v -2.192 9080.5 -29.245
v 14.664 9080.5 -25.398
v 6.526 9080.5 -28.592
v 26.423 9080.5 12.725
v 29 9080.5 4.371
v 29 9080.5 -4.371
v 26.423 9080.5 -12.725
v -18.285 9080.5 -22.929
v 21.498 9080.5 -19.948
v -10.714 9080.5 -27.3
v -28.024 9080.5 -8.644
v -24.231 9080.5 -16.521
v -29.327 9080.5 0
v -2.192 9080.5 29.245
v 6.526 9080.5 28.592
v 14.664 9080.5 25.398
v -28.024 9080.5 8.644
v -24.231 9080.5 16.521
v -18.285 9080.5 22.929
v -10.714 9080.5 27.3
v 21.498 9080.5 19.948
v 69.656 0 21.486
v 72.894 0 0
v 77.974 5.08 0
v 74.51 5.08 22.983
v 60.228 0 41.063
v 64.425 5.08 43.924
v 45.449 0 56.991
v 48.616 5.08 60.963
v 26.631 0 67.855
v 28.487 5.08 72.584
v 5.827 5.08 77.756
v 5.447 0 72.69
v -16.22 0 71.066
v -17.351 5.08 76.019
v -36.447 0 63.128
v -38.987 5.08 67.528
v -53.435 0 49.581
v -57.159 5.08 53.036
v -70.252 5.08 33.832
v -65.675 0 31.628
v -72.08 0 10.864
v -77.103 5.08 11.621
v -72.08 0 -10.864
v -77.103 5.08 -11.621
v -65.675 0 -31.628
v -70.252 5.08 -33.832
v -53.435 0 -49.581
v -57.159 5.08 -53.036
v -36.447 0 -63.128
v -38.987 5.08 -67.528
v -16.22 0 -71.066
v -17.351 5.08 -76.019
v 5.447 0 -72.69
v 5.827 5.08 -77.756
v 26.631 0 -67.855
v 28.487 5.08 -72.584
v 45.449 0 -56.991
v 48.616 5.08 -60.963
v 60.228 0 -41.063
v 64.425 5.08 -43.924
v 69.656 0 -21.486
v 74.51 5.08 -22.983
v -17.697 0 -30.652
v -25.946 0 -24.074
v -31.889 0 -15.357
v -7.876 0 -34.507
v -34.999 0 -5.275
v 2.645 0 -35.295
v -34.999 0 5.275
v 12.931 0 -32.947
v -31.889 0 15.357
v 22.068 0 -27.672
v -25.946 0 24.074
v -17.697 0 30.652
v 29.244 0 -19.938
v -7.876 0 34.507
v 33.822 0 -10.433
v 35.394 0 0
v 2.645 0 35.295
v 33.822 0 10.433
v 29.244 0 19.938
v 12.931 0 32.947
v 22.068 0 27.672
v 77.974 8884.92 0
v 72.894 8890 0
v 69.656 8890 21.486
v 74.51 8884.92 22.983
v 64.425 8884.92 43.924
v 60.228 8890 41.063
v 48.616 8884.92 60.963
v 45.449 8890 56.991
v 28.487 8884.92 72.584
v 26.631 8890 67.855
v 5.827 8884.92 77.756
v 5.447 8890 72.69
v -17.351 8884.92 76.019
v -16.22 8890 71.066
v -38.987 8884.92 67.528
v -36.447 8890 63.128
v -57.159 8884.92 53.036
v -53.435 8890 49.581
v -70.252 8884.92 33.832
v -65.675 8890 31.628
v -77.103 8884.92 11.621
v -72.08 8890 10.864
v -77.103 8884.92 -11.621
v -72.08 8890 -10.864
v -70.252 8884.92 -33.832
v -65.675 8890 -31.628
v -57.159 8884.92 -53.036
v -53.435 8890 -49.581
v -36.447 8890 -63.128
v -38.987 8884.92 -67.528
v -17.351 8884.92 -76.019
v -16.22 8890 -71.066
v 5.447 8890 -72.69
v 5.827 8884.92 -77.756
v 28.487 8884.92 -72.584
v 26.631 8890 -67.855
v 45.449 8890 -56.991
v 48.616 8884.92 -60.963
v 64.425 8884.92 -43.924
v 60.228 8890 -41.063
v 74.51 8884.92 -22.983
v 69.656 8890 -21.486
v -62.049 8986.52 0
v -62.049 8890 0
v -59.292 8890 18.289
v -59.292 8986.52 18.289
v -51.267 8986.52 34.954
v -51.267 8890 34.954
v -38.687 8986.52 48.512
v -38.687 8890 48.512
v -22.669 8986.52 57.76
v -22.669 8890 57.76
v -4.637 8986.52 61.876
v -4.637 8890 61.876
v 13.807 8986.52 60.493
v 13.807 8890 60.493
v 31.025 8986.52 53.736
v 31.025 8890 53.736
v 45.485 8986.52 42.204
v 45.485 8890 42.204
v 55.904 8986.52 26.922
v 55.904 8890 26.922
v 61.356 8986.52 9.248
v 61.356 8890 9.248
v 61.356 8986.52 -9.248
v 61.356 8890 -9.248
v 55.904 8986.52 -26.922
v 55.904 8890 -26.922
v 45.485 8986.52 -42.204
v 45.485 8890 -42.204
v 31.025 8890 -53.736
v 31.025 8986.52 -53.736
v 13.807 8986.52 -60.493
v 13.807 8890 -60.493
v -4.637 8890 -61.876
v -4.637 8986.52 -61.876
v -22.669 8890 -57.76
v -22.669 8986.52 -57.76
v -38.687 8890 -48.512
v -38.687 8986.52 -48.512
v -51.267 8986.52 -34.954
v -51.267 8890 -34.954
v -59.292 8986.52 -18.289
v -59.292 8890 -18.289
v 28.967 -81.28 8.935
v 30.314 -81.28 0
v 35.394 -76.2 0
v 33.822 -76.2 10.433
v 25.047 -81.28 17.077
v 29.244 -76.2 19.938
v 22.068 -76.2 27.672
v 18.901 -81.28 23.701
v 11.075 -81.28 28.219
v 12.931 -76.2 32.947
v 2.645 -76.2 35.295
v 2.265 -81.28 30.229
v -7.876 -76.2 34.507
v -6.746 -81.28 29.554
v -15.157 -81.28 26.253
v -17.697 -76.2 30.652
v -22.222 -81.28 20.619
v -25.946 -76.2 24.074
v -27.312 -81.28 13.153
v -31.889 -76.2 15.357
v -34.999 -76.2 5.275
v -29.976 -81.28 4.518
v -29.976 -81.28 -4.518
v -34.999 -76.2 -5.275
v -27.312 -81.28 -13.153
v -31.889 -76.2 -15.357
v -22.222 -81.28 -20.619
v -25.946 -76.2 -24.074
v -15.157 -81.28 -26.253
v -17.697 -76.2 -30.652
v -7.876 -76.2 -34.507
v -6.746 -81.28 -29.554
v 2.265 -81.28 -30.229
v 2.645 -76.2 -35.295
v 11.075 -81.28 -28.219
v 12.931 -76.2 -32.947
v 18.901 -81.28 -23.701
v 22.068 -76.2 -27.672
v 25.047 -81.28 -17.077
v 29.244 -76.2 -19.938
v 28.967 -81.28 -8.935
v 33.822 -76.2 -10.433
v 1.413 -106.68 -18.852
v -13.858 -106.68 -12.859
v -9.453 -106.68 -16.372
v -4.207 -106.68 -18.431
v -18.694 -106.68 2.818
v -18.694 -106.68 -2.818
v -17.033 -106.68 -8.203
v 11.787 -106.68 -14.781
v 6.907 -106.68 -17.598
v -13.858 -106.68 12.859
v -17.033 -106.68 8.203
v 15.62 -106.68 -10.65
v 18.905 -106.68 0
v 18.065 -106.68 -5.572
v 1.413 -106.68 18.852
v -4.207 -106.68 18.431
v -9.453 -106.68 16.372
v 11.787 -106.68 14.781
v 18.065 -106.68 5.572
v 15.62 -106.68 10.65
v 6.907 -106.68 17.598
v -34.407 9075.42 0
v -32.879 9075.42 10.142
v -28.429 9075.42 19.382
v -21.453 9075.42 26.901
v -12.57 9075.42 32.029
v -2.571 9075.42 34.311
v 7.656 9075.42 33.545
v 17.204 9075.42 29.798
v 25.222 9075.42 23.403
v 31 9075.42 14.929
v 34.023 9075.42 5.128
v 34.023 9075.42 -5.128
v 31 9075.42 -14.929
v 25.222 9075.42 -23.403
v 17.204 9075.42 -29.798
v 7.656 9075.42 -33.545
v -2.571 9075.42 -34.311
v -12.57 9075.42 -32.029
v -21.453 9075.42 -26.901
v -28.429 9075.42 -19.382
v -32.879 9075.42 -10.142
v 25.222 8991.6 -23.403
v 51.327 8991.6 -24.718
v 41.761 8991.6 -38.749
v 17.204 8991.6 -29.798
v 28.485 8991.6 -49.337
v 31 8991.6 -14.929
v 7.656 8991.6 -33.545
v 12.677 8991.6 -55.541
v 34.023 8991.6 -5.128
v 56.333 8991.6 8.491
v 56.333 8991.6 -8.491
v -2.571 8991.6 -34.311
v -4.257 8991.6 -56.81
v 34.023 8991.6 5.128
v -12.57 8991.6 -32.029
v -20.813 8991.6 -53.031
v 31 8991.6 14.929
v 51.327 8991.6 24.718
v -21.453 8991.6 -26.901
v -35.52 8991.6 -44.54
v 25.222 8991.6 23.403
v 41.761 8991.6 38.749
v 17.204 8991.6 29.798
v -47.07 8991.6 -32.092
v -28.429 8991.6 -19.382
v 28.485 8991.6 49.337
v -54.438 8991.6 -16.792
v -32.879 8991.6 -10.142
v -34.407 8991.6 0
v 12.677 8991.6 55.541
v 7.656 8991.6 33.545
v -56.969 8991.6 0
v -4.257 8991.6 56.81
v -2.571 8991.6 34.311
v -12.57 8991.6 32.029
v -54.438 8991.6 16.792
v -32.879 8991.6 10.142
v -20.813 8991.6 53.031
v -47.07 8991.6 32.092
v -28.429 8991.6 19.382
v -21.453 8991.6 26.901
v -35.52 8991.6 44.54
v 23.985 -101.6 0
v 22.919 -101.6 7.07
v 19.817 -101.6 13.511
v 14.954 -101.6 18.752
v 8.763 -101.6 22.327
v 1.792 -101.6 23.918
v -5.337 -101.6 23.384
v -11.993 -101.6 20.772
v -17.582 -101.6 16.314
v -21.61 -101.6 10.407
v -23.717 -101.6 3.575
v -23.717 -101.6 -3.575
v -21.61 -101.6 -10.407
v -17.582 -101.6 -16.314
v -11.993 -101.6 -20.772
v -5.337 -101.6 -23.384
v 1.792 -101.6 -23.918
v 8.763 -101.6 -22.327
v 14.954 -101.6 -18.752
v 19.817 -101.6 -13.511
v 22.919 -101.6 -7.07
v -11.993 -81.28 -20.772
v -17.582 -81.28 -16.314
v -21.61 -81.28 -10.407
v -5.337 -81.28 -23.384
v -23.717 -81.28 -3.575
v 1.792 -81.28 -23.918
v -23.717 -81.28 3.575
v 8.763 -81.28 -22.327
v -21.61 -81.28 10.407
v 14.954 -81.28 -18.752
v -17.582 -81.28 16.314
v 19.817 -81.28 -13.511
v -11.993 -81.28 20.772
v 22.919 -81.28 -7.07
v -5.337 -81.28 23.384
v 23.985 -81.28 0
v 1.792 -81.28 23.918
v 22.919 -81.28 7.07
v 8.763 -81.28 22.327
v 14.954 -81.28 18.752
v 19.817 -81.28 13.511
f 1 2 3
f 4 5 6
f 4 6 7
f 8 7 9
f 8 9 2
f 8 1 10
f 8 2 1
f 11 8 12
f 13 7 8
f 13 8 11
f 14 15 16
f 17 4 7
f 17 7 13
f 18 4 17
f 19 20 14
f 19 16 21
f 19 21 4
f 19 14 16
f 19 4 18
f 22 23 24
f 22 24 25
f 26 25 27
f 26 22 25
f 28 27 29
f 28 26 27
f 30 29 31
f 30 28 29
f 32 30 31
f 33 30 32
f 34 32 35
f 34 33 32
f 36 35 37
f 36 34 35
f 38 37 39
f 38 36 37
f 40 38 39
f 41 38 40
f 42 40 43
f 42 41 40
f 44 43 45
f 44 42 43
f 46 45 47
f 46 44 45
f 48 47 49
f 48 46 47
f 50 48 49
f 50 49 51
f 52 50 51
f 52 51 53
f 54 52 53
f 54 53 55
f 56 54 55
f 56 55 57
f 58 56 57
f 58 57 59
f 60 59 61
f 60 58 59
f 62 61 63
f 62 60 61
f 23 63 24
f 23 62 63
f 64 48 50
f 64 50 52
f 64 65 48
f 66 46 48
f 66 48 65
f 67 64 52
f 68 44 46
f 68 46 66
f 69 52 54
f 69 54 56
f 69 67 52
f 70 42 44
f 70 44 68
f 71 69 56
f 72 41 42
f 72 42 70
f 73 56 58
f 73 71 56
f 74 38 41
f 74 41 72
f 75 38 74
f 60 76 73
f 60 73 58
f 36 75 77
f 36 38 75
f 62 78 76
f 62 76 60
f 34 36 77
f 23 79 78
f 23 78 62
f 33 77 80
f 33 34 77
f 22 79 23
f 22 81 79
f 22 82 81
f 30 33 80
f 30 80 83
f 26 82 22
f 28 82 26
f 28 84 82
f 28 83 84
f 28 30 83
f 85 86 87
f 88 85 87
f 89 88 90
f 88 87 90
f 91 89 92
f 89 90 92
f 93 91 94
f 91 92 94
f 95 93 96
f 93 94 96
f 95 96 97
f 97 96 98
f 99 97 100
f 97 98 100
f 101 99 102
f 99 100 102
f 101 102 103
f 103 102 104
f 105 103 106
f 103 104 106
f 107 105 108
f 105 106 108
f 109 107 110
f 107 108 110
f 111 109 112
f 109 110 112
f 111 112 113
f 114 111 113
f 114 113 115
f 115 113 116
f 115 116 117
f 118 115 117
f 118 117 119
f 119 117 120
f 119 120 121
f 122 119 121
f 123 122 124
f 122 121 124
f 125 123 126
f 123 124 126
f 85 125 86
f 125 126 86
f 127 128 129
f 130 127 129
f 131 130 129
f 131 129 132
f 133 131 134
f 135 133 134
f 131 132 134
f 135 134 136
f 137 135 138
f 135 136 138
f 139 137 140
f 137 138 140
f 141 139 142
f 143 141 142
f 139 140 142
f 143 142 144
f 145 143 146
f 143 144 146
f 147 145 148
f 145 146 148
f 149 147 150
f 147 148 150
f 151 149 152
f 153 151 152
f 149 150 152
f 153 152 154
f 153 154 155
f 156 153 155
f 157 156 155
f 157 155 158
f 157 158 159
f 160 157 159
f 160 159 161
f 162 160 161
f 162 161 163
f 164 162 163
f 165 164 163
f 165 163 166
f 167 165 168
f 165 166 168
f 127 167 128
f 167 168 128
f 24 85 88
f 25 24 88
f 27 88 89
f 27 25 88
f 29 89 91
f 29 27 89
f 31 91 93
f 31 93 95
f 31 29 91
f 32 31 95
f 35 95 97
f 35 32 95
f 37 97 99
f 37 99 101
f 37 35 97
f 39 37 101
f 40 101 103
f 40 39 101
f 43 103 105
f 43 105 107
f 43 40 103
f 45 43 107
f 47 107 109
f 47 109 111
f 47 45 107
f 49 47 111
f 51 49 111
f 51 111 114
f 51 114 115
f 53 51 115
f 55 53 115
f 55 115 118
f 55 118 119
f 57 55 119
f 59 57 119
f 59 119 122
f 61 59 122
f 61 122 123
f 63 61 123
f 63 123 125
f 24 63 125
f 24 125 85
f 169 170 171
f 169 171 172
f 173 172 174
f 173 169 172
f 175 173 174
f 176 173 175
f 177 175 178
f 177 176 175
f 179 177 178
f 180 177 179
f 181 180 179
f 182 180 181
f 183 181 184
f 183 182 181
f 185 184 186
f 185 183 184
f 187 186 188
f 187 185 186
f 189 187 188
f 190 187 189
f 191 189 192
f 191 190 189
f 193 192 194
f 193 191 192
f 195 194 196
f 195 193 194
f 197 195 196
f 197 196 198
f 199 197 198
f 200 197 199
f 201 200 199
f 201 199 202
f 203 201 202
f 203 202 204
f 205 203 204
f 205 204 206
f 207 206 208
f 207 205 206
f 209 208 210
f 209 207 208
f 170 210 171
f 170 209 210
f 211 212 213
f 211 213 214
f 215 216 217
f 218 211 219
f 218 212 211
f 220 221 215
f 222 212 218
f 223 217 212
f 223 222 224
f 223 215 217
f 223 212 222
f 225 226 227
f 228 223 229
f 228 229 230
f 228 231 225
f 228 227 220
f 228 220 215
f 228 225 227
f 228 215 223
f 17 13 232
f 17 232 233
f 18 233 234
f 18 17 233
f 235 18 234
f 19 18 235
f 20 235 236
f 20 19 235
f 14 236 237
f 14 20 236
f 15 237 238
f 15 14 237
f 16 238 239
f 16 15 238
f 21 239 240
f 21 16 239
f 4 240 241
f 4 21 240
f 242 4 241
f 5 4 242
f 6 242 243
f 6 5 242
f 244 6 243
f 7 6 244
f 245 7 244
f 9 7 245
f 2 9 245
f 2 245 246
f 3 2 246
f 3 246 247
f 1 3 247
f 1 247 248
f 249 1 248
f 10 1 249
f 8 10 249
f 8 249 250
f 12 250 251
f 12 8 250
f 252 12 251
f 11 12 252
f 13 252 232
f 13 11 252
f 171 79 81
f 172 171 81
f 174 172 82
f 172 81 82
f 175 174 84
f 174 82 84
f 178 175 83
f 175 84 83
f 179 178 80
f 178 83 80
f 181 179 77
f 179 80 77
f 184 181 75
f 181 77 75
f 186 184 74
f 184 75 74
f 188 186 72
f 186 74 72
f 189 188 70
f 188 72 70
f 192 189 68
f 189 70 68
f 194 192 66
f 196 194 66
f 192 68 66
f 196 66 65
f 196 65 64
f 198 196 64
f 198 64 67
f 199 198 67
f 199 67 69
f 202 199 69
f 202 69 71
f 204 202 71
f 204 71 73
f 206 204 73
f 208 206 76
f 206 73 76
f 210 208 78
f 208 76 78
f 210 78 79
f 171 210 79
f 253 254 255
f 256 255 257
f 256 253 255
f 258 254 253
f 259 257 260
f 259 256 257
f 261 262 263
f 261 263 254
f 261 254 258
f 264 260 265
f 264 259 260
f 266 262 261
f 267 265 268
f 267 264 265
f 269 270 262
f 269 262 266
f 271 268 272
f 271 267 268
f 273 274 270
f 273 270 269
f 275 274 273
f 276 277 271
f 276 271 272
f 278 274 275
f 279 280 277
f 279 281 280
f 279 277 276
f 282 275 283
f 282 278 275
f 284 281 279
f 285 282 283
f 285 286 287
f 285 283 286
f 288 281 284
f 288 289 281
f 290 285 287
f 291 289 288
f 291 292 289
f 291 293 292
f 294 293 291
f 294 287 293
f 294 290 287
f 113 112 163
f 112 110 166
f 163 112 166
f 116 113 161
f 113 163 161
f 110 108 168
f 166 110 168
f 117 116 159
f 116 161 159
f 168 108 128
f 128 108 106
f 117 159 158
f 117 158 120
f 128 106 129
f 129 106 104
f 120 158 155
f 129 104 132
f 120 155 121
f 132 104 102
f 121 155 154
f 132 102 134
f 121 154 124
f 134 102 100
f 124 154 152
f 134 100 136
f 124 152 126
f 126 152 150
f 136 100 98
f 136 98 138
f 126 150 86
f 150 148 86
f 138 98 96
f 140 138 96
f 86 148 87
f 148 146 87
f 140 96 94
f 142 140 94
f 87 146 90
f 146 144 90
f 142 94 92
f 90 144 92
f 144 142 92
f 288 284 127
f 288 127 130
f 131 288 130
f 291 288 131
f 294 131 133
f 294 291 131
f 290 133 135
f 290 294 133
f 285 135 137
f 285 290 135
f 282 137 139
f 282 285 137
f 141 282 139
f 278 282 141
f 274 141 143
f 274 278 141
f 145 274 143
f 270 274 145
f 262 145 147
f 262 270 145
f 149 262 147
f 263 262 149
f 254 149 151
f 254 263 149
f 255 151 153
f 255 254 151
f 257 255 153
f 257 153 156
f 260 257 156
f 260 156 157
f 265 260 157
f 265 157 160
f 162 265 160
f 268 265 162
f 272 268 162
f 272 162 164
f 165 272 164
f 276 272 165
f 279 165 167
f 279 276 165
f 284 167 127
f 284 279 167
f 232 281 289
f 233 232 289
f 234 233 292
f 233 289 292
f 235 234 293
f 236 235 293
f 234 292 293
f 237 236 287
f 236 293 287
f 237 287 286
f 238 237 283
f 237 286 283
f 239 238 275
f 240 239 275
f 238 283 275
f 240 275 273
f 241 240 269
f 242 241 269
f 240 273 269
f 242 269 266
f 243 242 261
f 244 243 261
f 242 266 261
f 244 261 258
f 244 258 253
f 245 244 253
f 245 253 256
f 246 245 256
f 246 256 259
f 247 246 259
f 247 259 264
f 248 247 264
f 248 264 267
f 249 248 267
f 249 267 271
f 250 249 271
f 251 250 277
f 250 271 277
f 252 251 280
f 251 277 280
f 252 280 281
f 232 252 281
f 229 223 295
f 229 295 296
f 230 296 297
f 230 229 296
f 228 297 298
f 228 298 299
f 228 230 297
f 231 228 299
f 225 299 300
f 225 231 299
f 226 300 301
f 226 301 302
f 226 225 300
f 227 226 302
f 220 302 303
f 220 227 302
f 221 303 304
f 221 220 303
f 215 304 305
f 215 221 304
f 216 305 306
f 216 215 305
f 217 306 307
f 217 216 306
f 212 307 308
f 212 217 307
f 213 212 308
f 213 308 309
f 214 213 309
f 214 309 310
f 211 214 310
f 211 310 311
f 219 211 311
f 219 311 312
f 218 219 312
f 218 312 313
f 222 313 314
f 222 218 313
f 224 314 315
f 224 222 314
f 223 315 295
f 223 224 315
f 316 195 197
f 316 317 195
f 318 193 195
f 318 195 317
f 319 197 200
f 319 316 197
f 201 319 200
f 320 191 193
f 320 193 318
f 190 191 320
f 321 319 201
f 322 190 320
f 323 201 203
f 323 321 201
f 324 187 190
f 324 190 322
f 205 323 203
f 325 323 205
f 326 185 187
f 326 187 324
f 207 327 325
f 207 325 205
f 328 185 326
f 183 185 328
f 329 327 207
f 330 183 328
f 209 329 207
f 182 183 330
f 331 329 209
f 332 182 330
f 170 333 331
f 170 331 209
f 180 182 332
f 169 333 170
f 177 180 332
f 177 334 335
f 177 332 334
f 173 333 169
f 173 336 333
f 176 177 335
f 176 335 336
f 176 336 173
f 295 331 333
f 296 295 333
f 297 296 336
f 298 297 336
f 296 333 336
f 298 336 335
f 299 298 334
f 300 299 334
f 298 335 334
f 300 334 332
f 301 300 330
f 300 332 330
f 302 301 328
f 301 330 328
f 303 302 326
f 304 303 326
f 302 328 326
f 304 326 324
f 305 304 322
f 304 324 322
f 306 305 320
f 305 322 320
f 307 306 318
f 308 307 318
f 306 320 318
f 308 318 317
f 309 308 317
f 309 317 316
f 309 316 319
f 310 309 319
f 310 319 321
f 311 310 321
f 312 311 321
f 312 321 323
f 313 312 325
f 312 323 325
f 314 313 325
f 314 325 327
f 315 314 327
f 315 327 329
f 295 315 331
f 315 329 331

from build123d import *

# Parameters (mm, degrees)
F0_R       = 77.9740410351
F1_DEPTH   = 8890
F2_R       = 35.3941426272
F3_DEPTH   = 81.28
F4_R       = 23.9850349483
F1_FACE1_R = 77.9740410351
F5_DEPTH   = 25.4
F6_R       = 62.0491069306
F7_DEPTH   = 101.6
F8_R       = 34.4073238539
F9_DEPTH   = 88.9
F10_SIZE   = 5.08


with BuildPart() as f1:
    # F0 (on Front) → F1 (new body)
    with BuildSketch(Plane.XZ):
        Circle(F0_R)
    extrude(amount=-F1_DEPTH)

    # F2 (on face) → F3 (join)
    with BuildSketch(Plane.XZ):
        Circle(F2_R)
    extrude(amount=F3_DEPTH)

    # F4 (on face) + F1_face1 (on face) → F5 (join)
    with BuildSketch(Plane.XZ.offset(81.28)):
        Circle(F4_R)
    with BuildSketch(Plane(origin=(0, 8890, 0), x_dir=(1, 0, 0), z_dir=(0, 1, 0))):
        Circle(F1_FACE1_R)
    extrude(amount=F5_DEPTH, dir=(0, -1, 0))

    # F6 (on face) → F7 (join)
    with BuildSketch(Plane(origin=(0, 8890, 0), x_dir=(-1, 0, 0), z_dir=(0, 1, 0))):
        Circle(F6_R)
    extrude(amount=F7_DEPTH)

    # F8 (on face) → F9 (join)
    with BuildSketch(Plane(origin=(0, 8991.6, 0), x_dir=(-1, 0, 0), z_dir=(0, 1, 0))):
        Circle(F8_R)
    extrude(amount=F9_DEPTH)

    # F10
    f10_edges = [f1.edges().sort_by_distance(p)[0] for p in [
        (34.407324, 9080.5, 0),
        (62.049107, 8991.6, 0),
        (-77.974041, 8890, 0),
        (-77.974041, 0, 0),
        (-35.394143, -81.28, 0),
        (-23.985035, -106.68, 0),
    ]]
    chamfer(f10_edges, length=F10_SIZE)


solid = f1.part
